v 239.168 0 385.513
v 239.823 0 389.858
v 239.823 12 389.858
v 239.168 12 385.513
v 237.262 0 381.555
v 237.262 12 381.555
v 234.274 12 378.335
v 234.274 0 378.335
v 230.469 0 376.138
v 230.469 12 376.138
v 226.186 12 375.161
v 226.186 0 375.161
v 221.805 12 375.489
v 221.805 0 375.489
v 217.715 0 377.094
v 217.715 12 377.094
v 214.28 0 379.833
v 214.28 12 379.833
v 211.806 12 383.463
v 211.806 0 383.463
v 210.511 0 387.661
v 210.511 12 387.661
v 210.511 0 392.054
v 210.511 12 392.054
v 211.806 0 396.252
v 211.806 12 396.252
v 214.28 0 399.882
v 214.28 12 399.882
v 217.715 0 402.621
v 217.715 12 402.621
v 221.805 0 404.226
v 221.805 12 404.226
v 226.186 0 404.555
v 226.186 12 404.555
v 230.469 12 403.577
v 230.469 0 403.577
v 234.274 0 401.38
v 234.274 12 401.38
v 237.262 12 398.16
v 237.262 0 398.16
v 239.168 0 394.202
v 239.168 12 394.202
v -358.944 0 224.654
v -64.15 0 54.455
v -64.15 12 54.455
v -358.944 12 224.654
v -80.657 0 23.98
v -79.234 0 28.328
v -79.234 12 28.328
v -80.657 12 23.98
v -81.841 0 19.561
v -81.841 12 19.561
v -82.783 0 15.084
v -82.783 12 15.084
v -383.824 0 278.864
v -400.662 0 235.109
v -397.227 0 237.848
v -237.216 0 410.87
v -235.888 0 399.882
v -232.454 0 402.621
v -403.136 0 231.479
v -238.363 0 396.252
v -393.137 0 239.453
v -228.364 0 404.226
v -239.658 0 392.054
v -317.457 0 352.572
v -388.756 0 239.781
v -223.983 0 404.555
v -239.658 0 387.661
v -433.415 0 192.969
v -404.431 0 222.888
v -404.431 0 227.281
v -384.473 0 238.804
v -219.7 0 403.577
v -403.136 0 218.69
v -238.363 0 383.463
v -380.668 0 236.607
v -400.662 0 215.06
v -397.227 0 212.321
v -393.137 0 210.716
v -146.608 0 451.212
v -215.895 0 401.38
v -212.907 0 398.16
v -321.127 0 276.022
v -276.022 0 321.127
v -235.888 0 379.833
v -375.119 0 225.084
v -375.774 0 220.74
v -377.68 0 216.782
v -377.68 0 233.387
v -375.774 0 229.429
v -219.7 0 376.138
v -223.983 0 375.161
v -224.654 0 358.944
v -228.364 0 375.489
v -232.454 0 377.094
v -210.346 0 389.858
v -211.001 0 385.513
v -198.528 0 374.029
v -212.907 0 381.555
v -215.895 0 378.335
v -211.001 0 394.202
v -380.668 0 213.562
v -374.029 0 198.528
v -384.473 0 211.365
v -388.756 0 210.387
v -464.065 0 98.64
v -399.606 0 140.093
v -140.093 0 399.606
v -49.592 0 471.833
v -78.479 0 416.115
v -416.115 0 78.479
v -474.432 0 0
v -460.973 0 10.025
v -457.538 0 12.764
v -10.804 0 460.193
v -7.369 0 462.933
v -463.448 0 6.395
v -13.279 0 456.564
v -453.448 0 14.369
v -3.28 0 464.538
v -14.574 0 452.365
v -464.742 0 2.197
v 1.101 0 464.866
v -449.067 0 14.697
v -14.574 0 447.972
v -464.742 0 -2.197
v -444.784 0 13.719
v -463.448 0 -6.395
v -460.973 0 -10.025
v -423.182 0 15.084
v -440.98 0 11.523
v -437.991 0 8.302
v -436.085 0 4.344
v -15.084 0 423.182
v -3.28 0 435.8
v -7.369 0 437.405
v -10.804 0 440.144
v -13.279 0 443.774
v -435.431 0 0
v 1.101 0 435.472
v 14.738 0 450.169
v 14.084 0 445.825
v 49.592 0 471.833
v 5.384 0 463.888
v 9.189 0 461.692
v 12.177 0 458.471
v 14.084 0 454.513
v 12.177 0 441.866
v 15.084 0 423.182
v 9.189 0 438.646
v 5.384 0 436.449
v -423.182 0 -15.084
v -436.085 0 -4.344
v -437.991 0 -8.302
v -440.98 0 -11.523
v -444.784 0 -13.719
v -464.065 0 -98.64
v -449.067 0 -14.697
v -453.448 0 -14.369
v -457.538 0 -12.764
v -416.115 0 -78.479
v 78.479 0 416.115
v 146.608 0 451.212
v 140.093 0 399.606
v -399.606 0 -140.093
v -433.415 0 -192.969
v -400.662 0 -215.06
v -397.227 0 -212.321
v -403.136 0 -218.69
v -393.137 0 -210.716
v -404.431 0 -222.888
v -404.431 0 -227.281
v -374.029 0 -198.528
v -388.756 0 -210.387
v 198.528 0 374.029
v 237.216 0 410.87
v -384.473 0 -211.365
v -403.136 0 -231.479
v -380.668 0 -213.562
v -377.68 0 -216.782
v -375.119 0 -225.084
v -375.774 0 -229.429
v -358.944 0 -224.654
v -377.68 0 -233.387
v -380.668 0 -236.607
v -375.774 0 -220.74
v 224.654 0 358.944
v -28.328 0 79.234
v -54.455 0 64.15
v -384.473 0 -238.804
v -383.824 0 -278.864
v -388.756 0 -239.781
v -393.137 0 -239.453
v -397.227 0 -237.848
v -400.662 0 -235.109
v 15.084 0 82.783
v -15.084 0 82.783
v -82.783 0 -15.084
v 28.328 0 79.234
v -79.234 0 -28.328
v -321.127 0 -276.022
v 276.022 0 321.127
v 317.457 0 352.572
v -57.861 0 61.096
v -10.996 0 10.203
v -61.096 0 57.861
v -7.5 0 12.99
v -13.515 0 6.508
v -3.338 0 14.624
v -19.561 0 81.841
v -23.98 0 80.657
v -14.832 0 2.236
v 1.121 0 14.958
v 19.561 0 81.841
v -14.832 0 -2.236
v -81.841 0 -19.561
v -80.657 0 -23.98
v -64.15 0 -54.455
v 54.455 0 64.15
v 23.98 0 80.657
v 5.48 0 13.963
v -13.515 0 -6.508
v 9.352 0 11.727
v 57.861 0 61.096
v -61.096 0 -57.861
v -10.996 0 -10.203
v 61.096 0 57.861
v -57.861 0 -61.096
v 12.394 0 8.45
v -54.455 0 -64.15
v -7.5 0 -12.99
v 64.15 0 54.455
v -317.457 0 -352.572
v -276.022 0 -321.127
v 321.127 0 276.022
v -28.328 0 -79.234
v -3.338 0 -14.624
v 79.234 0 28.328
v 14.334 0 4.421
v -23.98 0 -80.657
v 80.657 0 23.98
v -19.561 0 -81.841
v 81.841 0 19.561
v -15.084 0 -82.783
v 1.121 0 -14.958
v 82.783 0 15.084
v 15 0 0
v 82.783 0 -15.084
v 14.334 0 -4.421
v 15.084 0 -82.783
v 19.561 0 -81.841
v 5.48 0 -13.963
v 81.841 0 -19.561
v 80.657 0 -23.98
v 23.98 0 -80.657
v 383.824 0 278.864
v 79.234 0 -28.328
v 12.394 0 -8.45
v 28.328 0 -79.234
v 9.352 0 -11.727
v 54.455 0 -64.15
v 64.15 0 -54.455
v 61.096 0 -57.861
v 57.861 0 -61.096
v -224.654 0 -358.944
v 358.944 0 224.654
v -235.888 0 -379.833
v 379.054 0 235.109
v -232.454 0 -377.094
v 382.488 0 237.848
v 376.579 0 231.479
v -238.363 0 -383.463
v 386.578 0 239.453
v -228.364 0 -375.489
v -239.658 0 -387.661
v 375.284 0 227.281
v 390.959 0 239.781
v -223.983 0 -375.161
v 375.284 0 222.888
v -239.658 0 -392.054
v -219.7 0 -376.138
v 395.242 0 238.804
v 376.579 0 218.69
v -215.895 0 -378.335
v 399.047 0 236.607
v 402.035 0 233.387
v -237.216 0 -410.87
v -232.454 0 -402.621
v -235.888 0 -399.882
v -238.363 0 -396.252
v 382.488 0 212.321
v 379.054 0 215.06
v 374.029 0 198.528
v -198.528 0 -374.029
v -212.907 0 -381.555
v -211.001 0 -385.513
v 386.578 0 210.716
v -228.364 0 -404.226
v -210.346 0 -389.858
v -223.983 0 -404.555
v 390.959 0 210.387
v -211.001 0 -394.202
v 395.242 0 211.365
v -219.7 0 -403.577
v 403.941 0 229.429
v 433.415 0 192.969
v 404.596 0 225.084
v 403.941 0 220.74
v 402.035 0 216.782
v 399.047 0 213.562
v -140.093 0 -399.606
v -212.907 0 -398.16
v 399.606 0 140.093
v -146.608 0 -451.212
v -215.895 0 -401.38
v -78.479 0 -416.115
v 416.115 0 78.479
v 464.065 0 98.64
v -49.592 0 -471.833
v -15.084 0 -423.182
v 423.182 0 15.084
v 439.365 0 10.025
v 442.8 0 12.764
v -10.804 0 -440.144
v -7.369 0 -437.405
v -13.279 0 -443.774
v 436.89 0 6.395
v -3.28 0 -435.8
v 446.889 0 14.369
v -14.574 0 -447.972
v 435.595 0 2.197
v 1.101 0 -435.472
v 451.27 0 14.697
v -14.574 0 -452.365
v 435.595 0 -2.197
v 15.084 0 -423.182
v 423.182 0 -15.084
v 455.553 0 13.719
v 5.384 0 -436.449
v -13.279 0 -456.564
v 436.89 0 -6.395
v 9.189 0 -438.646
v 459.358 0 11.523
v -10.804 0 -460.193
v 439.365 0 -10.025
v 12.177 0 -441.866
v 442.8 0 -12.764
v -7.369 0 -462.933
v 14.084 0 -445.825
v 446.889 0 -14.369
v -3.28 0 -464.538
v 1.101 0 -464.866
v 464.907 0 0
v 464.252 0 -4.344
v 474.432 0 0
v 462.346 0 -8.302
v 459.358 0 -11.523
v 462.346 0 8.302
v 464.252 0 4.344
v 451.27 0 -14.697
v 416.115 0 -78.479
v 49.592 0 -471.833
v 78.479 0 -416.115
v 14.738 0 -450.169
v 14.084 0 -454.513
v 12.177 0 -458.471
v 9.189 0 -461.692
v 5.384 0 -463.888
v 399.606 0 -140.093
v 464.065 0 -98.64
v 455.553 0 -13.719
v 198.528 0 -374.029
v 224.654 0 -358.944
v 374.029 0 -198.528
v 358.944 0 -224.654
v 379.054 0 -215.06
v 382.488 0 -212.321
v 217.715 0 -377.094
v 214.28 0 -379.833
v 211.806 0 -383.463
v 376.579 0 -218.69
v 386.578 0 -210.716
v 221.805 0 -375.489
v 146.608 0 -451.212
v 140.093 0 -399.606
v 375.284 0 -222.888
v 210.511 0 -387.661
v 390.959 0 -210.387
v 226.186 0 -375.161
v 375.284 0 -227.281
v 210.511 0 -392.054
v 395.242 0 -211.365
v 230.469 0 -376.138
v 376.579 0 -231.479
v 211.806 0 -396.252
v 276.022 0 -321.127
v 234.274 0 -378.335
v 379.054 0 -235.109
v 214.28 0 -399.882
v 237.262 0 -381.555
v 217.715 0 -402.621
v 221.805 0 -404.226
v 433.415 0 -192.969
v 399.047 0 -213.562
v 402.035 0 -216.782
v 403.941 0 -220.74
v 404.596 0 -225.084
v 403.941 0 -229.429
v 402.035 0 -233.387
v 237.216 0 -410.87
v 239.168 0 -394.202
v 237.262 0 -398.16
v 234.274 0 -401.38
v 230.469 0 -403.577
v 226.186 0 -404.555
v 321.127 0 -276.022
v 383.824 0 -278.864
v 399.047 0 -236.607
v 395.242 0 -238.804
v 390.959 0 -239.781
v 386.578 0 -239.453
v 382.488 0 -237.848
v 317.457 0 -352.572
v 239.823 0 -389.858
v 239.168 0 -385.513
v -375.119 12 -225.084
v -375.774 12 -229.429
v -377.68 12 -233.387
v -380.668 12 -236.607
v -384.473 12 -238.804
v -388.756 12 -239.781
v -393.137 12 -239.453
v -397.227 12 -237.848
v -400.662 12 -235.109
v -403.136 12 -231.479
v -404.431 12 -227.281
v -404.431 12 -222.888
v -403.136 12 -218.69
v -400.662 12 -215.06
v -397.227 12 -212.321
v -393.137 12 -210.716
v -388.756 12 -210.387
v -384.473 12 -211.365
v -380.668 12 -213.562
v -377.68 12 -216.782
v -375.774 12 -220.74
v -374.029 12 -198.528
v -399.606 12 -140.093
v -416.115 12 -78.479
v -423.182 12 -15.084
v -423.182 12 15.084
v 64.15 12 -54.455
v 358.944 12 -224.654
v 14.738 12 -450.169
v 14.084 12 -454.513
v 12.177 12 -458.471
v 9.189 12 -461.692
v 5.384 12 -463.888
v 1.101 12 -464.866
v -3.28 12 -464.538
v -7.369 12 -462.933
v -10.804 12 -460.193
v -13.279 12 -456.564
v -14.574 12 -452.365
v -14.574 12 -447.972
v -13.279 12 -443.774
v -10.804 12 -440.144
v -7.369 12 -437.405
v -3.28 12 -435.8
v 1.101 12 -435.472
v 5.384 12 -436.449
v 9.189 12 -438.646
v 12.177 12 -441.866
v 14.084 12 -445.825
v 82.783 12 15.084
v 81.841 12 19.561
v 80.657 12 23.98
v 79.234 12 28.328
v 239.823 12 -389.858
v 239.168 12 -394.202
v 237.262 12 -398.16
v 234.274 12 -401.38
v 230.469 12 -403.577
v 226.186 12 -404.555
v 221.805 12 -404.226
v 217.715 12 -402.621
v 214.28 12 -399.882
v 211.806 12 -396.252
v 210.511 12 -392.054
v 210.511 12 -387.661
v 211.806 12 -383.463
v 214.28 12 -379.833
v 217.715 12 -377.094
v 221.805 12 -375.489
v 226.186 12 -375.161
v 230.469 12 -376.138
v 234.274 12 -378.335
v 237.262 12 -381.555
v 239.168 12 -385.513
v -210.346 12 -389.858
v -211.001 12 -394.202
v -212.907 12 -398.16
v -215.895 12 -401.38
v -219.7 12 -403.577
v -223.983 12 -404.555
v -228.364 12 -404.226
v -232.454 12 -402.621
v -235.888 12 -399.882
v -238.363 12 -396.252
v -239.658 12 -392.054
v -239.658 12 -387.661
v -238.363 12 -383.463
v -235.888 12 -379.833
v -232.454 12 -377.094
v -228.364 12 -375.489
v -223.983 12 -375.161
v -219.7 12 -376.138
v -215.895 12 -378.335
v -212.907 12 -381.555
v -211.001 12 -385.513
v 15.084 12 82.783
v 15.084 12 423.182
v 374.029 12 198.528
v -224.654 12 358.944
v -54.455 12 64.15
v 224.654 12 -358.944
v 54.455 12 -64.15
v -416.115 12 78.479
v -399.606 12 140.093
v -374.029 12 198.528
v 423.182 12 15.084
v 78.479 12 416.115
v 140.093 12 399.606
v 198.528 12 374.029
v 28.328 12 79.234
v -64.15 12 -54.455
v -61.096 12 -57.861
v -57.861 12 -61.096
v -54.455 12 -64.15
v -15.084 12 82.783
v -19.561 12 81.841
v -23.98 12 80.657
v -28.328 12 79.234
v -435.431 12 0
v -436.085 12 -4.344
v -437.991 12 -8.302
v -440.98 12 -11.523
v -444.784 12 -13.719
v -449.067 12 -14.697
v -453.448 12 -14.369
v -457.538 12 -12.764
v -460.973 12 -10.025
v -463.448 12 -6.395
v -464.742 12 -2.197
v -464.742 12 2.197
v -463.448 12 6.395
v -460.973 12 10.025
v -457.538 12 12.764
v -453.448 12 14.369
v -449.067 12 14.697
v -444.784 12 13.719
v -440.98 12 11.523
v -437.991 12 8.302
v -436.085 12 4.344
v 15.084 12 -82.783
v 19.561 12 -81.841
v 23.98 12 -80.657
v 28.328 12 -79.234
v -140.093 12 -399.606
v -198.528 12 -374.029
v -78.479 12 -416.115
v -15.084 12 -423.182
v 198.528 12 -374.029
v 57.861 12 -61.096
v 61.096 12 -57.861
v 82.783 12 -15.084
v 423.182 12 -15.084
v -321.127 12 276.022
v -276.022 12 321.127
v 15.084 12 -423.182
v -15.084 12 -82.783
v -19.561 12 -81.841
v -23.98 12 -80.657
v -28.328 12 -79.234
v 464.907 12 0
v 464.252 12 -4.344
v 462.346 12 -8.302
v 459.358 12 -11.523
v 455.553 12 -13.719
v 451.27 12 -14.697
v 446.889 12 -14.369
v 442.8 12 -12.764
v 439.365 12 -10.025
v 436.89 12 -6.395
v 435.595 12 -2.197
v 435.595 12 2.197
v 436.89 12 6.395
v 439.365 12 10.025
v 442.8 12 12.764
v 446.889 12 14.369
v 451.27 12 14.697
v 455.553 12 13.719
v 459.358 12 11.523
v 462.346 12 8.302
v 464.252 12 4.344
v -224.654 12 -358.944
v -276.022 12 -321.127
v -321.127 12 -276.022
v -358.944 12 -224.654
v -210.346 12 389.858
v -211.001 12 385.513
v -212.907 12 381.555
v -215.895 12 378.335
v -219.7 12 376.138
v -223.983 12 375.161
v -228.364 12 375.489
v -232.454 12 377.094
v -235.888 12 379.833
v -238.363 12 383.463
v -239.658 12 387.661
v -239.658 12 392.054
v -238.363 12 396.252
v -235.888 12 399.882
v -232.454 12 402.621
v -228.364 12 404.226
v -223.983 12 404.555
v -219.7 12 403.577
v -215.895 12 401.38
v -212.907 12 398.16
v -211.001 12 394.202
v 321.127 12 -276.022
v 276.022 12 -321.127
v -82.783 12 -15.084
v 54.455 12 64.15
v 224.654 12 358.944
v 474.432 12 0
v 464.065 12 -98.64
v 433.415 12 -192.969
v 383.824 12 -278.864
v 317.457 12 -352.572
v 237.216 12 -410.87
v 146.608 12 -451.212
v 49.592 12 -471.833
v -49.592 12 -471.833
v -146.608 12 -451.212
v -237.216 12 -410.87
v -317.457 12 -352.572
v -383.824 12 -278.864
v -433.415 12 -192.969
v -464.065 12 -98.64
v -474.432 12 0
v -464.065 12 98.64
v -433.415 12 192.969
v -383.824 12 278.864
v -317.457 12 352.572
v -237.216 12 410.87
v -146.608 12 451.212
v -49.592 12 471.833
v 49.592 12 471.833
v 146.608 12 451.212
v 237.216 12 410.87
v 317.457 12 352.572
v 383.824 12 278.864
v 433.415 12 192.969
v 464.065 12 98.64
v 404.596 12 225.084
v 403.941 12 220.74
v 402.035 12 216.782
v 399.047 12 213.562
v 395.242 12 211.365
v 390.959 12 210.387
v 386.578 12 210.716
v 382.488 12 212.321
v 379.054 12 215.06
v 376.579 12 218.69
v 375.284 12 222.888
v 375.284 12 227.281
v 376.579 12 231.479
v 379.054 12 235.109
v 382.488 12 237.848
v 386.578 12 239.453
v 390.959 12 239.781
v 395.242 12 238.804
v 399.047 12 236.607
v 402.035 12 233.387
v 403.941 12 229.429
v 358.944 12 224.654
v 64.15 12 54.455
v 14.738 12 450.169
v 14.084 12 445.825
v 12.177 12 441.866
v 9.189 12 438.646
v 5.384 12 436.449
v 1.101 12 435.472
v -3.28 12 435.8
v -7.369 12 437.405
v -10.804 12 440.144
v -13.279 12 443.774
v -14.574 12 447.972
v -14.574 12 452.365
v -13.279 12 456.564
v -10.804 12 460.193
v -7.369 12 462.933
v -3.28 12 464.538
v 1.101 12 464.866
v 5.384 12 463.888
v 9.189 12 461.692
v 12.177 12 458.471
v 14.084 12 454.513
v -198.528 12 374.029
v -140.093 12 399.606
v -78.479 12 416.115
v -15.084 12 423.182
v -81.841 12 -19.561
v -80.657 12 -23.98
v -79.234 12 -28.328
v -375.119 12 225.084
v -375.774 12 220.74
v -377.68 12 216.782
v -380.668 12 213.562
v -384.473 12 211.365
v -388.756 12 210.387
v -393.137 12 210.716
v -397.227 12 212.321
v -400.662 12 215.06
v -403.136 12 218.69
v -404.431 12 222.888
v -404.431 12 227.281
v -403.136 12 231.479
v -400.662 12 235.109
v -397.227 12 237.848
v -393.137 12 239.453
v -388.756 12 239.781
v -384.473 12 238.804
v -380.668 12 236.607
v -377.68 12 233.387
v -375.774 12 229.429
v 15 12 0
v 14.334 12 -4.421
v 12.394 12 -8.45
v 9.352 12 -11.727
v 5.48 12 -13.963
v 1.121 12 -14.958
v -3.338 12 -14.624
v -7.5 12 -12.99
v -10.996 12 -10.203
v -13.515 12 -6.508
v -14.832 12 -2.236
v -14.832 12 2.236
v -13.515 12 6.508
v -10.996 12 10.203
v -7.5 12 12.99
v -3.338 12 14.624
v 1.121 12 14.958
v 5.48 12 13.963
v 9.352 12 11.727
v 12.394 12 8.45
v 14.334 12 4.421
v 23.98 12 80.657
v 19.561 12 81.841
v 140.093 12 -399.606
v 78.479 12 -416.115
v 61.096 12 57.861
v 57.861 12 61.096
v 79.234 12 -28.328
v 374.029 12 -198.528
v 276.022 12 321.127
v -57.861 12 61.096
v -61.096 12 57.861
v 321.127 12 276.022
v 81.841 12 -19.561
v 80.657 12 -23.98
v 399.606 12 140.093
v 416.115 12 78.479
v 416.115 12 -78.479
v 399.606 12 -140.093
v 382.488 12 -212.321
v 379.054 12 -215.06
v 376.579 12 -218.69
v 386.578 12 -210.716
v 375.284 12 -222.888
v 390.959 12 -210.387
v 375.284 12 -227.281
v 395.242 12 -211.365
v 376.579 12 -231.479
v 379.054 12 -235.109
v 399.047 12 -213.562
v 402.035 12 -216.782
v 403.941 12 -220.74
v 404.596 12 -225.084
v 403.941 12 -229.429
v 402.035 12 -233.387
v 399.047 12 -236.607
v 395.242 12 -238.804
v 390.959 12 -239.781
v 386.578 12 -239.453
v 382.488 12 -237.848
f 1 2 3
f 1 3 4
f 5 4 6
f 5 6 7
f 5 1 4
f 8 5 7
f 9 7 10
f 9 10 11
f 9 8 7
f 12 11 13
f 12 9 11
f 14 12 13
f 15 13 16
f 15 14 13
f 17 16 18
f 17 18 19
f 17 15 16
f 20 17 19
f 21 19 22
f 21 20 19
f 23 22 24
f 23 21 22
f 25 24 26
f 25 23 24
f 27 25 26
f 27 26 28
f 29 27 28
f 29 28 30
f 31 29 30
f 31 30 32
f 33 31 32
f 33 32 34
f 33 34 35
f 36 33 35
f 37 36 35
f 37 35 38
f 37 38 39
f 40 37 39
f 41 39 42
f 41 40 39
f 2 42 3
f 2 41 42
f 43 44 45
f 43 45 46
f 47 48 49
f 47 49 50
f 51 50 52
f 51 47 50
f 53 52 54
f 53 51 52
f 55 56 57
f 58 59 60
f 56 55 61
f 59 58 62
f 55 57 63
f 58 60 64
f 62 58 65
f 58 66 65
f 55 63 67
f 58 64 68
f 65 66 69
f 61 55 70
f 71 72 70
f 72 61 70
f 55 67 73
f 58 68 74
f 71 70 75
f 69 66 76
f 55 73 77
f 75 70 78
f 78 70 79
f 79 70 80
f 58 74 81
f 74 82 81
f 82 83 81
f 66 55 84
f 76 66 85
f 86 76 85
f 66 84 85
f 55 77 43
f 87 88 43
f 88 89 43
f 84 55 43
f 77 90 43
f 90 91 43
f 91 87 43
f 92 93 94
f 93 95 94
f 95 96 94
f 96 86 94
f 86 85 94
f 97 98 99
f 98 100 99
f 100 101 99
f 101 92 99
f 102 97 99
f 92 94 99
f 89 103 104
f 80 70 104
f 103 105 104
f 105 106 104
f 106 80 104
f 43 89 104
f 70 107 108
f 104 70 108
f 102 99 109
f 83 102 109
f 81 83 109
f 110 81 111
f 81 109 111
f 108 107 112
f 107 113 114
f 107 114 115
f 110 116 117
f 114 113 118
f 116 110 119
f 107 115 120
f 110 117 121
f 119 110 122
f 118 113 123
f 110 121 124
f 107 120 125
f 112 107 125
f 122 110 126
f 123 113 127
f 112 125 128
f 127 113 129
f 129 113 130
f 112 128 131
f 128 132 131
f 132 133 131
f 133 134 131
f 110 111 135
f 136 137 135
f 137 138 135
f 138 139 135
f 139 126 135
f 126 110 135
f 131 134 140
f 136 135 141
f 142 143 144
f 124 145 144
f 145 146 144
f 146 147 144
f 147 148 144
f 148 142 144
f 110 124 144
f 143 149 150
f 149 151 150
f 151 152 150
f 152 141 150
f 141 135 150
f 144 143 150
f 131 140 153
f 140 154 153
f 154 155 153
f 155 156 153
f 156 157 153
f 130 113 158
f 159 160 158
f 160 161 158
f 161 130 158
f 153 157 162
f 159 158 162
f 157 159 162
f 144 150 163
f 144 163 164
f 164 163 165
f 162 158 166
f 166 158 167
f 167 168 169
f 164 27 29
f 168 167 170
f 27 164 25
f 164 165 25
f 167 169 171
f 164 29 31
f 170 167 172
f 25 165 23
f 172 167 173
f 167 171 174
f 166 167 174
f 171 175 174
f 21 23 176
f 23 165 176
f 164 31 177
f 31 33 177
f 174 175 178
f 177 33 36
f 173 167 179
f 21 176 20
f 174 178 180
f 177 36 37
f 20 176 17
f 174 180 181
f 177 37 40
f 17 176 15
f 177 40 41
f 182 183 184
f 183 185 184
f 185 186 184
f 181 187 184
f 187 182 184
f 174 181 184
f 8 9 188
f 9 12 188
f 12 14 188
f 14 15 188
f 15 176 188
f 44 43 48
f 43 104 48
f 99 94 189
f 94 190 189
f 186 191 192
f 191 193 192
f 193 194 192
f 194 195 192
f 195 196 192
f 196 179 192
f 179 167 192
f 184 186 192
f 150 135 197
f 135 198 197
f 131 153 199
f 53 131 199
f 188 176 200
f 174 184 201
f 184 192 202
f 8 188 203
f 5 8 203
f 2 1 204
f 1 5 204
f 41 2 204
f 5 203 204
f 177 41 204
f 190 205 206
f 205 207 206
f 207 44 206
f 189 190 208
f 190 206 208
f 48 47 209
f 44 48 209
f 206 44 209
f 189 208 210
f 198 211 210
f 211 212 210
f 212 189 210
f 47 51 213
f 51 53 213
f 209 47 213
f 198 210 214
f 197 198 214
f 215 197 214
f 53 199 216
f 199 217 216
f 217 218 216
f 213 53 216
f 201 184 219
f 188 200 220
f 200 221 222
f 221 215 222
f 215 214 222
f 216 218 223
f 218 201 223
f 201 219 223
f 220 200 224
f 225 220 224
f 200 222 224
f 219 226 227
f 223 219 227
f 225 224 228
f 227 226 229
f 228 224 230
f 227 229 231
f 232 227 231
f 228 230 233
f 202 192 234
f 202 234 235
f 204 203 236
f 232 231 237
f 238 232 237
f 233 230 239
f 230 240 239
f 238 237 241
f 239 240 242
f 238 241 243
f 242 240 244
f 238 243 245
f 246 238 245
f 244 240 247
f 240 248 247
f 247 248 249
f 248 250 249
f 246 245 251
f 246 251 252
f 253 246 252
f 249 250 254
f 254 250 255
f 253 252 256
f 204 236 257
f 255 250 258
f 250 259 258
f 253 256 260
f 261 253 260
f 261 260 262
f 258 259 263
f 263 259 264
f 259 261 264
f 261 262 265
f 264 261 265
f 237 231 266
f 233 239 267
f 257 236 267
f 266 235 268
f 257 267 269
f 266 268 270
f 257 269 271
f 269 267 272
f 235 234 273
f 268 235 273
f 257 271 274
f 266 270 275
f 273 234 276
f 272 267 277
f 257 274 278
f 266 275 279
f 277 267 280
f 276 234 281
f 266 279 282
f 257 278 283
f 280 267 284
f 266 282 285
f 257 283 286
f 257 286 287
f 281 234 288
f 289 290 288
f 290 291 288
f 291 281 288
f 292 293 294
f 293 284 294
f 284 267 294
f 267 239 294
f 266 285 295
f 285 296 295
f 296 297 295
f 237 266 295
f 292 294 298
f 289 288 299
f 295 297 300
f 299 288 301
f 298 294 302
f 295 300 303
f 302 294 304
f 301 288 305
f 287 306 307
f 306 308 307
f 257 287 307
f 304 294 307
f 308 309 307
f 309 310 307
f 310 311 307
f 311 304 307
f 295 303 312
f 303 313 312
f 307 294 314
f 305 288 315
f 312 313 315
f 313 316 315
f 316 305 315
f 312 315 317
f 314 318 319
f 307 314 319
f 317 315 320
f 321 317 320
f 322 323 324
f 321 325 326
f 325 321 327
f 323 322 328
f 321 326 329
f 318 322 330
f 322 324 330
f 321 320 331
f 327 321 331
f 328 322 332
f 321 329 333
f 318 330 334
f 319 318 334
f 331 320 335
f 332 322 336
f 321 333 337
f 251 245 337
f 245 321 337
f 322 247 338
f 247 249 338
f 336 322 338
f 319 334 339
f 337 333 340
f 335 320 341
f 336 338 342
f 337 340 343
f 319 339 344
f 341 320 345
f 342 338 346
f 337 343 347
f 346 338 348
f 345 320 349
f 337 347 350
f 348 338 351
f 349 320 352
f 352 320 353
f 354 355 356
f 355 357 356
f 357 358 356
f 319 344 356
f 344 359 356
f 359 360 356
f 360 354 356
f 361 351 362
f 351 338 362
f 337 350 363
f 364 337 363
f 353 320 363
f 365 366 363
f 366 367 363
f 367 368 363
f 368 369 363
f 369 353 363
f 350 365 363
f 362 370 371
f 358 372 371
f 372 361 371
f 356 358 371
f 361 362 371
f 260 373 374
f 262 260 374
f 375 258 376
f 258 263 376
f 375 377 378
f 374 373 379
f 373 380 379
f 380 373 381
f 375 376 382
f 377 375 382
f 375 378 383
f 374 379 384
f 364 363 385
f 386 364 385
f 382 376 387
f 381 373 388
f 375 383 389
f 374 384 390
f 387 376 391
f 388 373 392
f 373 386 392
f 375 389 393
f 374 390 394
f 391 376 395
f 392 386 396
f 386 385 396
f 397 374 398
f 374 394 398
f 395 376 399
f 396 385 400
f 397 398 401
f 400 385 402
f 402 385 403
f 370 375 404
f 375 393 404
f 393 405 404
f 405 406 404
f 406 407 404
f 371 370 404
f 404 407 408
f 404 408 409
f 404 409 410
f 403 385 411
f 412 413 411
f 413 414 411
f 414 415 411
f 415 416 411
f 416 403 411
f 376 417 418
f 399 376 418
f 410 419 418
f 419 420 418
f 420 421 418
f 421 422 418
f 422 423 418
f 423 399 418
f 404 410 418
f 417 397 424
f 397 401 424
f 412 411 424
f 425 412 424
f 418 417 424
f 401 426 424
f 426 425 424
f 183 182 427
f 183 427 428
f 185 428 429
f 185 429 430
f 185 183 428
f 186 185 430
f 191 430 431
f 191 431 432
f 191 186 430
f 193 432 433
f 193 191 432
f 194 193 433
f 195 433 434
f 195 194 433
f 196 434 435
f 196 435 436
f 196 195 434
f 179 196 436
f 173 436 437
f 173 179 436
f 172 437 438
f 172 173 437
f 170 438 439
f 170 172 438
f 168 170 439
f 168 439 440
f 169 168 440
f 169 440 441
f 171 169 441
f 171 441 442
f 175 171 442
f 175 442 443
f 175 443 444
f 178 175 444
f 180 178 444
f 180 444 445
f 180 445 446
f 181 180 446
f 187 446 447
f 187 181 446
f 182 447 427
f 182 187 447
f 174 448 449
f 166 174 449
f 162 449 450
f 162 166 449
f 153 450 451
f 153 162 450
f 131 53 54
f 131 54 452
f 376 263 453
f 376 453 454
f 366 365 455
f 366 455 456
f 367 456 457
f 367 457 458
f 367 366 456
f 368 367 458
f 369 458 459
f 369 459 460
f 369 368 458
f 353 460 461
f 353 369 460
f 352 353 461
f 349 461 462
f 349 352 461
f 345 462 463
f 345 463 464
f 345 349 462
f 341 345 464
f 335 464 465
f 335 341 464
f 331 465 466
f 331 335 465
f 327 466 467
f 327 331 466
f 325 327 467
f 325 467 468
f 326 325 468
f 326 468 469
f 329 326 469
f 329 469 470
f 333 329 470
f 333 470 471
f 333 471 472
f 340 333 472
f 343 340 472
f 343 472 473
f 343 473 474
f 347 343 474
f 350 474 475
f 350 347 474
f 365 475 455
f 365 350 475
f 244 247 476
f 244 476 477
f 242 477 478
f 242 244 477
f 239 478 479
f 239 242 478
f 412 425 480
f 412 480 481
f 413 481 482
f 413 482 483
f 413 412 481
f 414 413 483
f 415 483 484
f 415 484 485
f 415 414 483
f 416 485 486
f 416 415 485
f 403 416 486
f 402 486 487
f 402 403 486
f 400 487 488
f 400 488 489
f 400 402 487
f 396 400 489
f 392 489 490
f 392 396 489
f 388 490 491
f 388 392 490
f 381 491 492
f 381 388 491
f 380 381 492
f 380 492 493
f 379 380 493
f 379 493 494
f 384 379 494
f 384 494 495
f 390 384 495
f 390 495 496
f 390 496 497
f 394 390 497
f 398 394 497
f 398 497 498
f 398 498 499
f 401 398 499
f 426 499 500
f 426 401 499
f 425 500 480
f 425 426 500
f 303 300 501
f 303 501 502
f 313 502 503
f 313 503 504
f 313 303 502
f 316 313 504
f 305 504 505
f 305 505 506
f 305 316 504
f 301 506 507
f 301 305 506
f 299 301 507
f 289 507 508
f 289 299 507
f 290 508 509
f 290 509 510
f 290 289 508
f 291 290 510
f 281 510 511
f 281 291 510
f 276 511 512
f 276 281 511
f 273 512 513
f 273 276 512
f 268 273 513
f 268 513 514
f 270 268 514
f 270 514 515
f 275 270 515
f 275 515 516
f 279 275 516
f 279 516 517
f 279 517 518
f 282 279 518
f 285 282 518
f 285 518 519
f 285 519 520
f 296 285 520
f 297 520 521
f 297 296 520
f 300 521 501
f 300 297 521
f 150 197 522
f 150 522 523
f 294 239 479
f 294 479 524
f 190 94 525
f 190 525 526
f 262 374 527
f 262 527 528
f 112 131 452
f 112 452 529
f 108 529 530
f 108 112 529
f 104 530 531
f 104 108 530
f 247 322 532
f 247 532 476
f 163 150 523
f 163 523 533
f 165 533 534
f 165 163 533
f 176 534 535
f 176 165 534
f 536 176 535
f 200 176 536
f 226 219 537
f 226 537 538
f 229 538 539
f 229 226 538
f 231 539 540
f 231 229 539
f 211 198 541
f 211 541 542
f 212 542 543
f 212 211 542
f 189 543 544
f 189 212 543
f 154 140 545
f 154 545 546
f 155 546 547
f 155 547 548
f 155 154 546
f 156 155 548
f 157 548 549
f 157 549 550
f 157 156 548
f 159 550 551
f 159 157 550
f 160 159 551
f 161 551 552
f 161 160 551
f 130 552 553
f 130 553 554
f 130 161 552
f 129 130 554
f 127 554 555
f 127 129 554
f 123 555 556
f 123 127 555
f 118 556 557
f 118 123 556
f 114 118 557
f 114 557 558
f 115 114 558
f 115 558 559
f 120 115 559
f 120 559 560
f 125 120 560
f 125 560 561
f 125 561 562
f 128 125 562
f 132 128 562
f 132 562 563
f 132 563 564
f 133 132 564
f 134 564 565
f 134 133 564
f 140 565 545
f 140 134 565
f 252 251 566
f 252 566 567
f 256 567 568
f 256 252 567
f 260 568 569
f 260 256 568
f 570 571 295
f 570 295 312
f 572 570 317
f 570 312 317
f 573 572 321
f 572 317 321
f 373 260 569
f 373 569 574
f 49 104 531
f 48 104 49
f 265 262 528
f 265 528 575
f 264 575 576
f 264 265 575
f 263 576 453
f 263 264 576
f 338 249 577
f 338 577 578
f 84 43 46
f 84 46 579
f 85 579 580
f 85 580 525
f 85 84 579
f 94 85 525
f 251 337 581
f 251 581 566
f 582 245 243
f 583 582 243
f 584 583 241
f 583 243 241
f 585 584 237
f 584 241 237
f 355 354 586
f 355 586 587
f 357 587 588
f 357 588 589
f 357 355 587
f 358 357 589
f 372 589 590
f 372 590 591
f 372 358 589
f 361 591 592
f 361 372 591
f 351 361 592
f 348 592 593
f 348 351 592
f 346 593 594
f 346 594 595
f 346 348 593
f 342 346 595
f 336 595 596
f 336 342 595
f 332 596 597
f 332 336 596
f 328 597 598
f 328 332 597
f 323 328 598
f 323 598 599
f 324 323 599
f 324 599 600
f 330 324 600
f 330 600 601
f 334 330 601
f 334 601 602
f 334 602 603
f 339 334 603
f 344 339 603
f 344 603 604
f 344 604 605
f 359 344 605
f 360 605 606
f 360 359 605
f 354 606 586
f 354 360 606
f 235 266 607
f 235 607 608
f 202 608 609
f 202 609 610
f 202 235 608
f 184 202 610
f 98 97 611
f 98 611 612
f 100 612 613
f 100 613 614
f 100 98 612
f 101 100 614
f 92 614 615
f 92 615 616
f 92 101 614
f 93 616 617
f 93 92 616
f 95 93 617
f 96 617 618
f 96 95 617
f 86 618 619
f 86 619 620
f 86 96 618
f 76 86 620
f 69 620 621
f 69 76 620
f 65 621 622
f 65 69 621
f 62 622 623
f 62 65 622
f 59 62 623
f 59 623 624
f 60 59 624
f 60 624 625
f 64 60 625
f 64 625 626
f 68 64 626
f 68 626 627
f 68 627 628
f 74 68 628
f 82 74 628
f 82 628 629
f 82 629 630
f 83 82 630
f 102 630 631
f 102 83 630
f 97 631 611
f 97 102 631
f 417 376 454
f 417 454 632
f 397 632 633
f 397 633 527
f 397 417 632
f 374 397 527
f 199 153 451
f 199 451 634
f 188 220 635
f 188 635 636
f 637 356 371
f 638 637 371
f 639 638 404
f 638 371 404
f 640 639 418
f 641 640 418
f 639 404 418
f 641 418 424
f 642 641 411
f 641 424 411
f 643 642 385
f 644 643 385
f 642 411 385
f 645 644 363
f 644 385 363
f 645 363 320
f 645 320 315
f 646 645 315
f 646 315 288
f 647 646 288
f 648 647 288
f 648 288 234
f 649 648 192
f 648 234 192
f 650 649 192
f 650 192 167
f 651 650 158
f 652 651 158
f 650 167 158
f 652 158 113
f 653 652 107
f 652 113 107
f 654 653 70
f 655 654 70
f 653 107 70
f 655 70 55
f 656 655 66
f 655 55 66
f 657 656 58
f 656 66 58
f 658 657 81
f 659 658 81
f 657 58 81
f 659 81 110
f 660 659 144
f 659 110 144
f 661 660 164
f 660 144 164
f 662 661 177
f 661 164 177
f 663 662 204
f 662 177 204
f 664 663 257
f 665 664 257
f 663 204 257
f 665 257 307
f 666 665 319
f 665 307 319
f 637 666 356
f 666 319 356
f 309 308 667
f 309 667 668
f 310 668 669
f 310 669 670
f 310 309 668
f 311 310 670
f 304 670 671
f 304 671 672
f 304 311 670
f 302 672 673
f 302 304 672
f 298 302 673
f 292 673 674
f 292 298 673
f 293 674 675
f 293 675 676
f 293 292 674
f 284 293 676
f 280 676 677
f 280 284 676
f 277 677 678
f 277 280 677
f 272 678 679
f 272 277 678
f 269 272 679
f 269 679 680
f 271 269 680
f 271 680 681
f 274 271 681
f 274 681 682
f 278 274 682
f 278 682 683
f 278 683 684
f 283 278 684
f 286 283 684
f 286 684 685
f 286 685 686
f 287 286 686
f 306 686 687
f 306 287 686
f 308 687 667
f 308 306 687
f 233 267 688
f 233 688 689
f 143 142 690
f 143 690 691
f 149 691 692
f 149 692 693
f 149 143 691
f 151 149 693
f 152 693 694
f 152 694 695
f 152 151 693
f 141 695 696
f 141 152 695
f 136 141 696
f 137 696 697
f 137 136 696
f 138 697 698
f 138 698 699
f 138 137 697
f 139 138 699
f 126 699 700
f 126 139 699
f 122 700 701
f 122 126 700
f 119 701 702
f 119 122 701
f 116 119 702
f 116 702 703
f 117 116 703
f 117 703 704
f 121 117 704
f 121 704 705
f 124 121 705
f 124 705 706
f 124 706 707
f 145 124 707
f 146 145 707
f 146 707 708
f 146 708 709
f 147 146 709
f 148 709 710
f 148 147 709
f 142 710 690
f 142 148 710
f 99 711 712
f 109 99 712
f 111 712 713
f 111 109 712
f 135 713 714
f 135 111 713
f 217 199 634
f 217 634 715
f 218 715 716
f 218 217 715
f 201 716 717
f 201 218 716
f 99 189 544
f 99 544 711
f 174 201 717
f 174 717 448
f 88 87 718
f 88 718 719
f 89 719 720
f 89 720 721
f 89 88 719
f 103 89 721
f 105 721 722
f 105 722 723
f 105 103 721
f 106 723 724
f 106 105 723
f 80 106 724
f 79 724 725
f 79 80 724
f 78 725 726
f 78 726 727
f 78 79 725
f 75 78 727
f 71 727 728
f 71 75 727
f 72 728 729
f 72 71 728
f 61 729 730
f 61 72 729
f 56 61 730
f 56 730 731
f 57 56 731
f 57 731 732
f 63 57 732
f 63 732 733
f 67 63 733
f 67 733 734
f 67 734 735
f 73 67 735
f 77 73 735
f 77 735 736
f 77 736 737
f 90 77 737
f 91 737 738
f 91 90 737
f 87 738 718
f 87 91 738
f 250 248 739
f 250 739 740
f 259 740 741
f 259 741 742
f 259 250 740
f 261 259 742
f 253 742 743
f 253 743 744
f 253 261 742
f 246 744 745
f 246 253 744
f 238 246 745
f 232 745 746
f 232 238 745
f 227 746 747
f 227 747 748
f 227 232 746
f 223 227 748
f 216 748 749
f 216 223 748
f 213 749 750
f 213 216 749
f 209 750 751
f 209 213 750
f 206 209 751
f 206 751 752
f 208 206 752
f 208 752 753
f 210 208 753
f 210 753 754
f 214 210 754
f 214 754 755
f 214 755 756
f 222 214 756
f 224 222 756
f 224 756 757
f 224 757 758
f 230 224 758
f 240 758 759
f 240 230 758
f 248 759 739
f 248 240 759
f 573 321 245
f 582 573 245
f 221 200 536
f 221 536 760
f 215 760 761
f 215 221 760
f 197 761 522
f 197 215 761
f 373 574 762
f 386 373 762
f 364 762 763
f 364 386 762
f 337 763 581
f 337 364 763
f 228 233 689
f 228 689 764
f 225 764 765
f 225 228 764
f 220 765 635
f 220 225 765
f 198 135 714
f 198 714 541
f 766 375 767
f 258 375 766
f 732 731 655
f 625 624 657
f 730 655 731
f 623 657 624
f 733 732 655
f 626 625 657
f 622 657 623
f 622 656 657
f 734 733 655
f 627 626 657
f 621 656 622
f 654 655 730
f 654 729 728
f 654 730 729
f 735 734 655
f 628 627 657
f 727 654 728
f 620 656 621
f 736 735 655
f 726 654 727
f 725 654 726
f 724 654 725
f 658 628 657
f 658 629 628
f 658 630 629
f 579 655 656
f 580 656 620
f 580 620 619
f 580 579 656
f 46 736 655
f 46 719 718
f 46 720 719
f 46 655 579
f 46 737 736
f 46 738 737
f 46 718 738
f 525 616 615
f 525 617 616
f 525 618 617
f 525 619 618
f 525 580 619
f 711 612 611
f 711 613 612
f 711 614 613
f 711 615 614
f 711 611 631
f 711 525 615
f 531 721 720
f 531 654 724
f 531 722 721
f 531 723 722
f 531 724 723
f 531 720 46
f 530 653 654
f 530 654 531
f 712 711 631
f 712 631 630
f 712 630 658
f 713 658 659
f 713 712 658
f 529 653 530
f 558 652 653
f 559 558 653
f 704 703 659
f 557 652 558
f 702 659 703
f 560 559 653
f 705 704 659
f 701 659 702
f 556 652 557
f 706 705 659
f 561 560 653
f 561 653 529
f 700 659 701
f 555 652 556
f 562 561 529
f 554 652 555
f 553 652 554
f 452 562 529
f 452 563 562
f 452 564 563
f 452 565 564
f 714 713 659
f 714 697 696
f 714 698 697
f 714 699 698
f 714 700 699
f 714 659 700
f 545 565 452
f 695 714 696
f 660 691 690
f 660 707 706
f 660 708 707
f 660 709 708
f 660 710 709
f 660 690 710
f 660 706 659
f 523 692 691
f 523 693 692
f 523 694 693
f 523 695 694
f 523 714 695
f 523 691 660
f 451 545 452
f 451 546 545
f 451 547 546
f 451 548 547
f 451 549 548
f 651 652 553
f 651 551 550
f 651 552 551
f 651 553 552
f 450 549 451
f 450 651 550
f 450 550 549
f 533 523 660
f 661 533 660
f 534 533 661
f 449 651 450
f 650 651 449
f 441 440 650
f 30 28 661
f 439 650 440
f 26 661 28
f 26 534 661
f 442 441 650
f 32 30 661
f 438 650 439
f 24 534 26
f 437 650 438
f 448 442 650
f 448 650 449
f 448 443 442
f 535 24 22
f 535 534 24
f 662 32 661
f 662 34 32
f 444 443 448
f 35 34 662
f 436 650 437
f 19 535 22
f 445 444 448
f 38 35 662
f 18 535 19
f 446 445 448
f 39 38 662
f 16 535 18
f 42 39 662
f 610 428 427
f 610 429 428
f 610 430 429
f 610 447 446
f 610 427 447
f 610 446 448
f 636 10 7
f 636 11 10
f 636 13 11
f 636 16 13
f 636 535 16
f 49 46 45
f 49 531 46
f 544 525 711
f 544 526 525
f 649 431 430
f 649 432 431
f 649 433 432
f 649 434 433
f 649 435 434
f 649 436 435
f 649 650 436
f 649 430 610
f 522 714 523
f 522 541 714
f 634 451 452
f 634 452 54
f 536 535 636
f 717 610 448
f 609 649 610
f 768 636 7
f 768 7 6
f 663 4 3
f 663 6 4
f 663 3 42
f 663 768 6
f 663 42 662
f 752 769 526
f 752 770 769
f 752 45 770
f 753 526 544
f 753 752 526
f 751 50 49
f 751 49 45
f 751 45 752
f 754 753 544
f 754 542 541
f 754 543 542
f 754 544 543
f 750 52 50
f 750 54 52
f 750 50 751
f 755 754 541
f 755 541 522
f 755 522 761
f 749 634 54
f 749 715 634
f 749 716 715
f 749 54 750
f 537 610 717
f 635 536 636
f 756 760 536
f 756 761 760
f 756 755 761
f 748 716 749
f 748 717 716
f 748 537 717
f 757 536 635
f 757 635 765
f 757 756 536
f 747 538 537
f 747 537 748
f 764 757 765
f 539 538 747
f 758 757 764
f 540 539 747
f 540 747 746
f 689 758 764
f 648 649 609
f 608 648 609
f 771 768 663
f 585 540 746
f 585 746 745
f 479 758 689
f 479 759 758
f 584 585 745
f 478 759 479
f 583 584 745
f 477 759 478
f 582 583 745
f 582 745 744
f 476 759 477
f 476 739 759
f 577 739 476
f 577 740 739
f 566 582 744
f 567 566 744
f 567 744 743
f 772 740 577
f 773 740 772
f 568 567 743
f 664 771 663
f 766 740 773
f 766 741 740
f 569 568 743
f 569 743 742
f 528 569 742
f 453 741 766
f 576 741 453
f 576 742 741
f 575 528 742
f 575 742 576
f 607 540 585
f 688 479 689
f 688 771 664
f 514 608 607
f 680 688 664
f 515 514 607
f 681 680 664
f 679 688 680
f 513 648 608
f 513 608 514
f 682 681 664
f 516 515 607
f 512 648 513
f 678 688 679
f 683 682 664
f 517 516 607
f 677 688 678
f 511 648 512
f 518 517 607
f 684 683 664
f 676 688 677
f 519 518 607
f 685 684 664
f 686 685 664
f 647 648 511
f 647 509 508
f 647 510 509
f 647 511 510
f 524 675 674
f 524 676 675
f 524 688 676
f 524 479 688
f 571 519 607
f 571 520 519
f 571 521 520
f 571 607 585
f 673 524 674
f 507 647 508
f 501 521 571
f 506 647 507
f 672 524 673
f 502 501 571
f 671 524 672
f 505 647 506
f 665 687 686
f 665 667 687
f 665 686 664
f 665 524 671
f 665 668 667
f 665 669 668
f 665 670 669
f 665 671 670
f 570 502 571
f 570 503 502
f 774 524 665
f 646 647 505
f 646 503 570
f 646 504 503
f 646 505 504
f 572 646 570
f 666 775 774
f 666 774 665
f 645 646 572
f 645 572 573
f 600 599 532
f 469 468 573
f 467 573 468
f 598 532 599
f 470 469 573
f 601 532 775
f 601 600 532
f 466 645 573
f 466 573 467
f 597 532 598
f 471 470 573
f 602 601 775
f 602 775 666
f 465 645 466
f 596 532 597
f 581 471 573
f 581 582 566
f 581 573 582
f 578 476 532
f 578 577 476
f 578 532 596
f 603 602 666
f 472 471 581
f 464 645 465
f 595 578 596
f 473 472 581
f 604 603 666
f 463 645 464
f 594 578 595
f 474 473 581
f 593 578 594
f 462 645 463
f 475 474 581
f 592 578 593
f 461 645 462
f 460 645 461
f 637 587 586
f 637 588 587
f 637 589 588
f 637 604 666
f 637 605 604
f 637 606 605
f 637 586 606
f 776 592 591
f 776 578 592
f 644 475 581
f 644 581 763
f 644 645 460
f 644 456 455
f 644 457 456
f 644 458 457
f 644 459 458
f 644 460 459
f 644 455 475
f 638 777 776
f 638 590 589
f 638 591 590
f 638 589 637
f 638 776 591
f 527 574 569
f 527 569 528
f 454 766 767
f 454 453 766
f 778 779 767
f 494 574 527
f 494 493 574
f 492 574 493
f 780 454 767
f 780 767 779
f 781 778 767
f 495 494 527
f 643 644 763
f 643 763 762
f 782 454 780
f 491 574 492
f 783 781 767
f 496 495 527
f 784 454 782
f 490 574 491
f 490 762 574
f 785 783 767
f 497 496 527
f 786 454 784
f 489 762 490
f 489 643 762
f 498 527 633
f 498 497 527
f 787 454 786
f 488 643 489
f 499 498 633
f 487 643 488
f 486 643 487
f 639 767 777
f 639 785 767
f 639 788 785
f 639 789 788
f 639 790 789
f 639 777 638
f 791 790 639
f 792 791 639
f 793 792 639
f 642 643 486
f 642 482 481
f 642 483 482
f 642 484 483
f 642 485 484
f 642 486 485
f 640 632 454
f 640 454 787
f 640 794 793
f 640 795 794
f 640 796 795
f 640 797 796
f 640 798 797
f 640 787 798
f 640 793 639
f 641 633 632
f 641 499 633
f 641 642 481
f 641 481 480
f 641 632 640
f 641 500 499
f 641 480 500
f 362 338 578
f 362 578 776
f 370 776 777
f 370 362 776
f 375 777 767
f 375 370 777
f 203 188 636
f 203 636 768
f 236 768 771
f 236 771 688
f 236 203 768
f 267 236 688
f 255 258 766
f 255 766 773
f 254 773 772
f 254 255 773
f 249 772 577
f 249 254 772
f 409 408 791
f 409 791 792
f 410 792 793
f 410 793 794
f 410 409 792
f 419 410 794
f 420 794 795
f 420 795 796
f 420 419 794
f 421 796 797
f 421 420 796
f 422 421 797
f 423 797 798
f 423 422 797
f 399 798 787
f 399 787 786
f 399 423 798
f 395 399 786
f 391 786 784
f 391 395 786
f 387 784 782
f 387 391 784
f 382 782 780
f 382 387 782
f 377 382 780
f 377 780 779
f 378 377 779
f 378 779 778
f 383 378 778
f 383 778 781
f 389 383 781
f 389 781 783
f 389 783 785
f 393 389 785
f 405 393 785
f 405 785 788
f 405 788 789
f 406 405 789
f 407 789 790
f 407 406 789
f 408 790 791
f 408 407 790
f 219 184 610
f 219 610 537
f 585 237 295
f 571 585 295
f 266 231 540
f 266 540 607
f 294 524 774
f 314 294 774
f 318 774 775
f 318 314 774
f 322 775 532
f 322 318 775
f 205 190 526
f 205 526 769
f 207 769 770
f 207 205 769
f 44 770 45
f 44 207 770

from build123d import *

# Parameters (mm, degrees)
SKETCH1_R            = 474.432327188
SKETCH1_R_2          = 15
SKETCH1_R_3          = 14.738282491
BOSS_EXTRUDE15_DEPTH = 12


with BuildPart() as part:
    # Sketch1 → Boss-Extrude15 (new body)
    with BuildSketch(Plane(origin=(0, 0, 0), x_dir=(1, 0, 0), z_dir=(0, 1, 0))):
        Circle(SKETCH1_R)
        Circle(SKETCH1_R_2, mode=Mode.SUBTRACT)
        with Locations((0, 450.168808025)):
            Circle(SKETCH1_R_3, mode=Mode.SUBTRACT)
        with Locations((225.084404013, 389.857623741)):
            Circle(SKETCH1_R_3, mode=Mode.SUBTRACT)
        with Locations((389.857623741, 225.084404013)):
            Circle(SKETCH1_R_3, mode=Mode.SUBTRACT)
        with Locations((450.168808025, 0)):
            Circle(SKETCH1_R_3, mode=Mode.SUBTRACT)
        with Locations((389.857623741, -225.084404013)):
            Circle(SKETCH1_R_3, mode=Mode.SUBTRACT)
        with Locations((225.084404013, -389.857623741)):
            Circle(SKETCH1_R_3, mode=Mode.SUBTRACT)
        with Locations((0, -450.168808025)):
            Circle(SKETCH1_R_3, mode=Mode.SUBTRACT)
        with Locations((-225.084404012, -389.857623741)):
            Circle(SKETCH1_R_3, mode=Mode.SUBTRACT)
        with Locations((-389.857623741, -225.084404013)):
            Circle(SKETCH1_R_3, mode=Mode.SUBTRACT)
        with Locations((-450.168808025, 0)):
            Circle(SKETCH1_R_3, mode=Mode.SUBTRACT)
        with Locations((-389.857623741, 225.084404013)):
            Circle(SKETCH1_R_3, mode=Mode.SUBTRACT)
        with Locations((-225.084404013, 389.857623741)):
            Circle(SKETCH1_R_3, mode=Mode.SUBTRACT)
        with BuildLine():
            Line((15.084021598, 423.182152072), (15.084021598, 82.782783758))
            ThreePointArc((15.084021598, 82.782783758), (21.778537661, 81.278609065), (28.328245984, 79.234004529))
            Line((28.328245984, 79.234004529), (198.527930141, 374.028504921))
            ThreePointArc((198.527930141, 374.028504921), (109.597156617, 409.022156859), (15.084021598, 423.182152072))
        make_face(mode=Mode.SUBTRACT)
        with BuildLine():
            Line((-15.084021598, 423.182152072), (-15.084021598, 82.782783758))
            ThreePointArc((-15.084021598, 82.782783758), (-21.778537661, 81.278609065), (-28.328245984, 79.234004529))
            Line((-28.328245984, 79.234004529), (-198.527930141, 374.028504921))
            ThreePointArc((-198.527930141, 374.028504921), (-109.597156617, 409.022156859), (-15.084021598, 423.182152072))
        make_face(mode=Mode.SUBTRACT)
        with BuildLine():
            Line((224.654221931, 358.944483323), (54.454537774, 64.149982931))
            ThreePointArc((54.454537774, 64.149982931), (59.500071404, 59.500071404), (64.149982931, 54.454537774))
            Line((64.149982931, 54.454537774), (358.944483323, 224.654221931))
            ThreePointArc((358.944483323, 224.654221931), (299.425000242, 299.425000242), (224.654221931, 358.944483323))
        make_face(mode=Mode.SUBTRACT)
        with BuildLine():
            Line((374.028504921, 198.527930141), (79.234004529, 28.328245984))
            ThreePointArc((79.234004529, 28.328245984), (81.278609065, 21.778537661), (82.782783758, 15.084021598))
            Line((82.782783758, 15.084021598), (423.182152072, 15.084021598))
            ThreePointArc((423.182152072, 15.084021598), (409.022156859, 109.597156617), (374.028504921, 198.527930141))
        make_face(mode=Mode.SUBTRACT)
        with BuildLine():
            Line((423.182152072, -15.084021598), (82.782783758, -15.084021598))
            ThreePointArc((82.782783758, -15.084021598), (81.278609065, -21.778537661), (79.234004529, -28.328245984))
            Line((79.234004529, -28.328245984), (374.028504921, -198.527930141))
            ThreePointArc((374.028504921, -198.527930141), (409.022156859, -109.597156617), (423.182152072, -15.084021598))
        make_face(mode=Mode.SUBTRACT)
        with BuildLine():
            Line((358.944483323, -224.654221931), (64.149982931, -54.454537774))
            ThreePointArc((64.149982931, -54.454537774), (59.500071404, -59.500071404), (54.454537774, -64.149982931))
            Line((54.454537774, -64.149982931), (224.654221931, -358.944483323))
            ThreePointArc((224.654221931, -358.944483323), (299.425000242, -299.425000242), (358.944483323, -224.654221931))
        make_face(mode=Mode.SUBTRACT)
        with BuildLine():
            Line((198.527930141, -374.028504921), (28.328245984, -79.234004529))
            ThreePointArc((28.328245984, -79.234004529), (21.778537661, -81.278609065), (15.084021598, -82.782783758))
            Line((15.084021598, -82.782783758), (15.084021598, -423.182152072))
            ThreePointArc((15.084021598, -423.182152072), (109.597156617, -409.022156859), (198.527930141, -374.028504921))
        make_face(mode=Mode.SUBTRACT)
        with BuildLine():
            Line((-15.084021598, -423.182152072), (-15.084021598, -82.782783758))
            ThreePointArc((-15.084021598, -82.782783758), (-21.778537661, -81.278609065), (-28.328245984, -79.234004529))
            Line((-28.328245984, -79.234004529), (-198.527930141, -374.028504921))
            ThreePointArc((-198.527930141, -374.028504921), (-109.597156617, -409.022156859), (-15.084021598, -423.182152072))
        make_face(mode=Mode.SUBTRACT)
        with BuildLine():
            Line((-224.654221931, -358.944483323), (-54.454537774, -64.149982931))
            ThreePointArc((-54.454537774, -64.149982931), (-59.500071404, -59.500071404), (-64.149982931, -54.454537774))
            Line((-64.149982931, -54.454537774), (-358.944483323, -224.654221931))
            ThreePointArc((-358.944483323, -224.654221931), (-299.425000242, -299.425000242), (-224.654221931, -358.944483323))
        make_face(mode=Mode.SUBTRACT)
        with BuildLine():
            Line((-374.028504921, -198.527930141), (-79.234004529, -28.328245984))
            ThreePointArc((-79.234004529, -28.328245984), (-81.278609065, -21.778537661), (-82.782783758, -15.084021598))
            Line((-82.782783758, -15.084021598), (-423.182152072, -15.084021598))
            ThreePointArc((-423.182152072, -15.084021598), (-409.022156859, -109.597156617), (-374.028504921, -198.527930141))
        make_face(mode=Mode.SUBTRACT)
        with BuildLine():
            Line((-423.182152072, 15.084021598), (-82.782783758, 15.084021598))
            ThreePointArc((-82.782783758, 15.084021598), (-81.278609065, 21.778537661), (-79.234004529, 28.328245984))
            Line((-79.234004529, 28.328245984), (-374.028504921, 198.527930141))
            ThreePointArc((-374.028504921, 198.527930141), (-409.022156859, 109.597156617), (-423.182152072, 15.084021598))
        make_face(mode=Mode.SUBTRACT)
        with BuildLine():
            Line((-358.944483323, 224.654221931), (-64.149982931, 54.454537774))
            ThreePointArc((-64.149982931, 54.454537774), (-59.500071404, 59.500071404), (-54.454537774, 64.149982931))
            Line((-54.454537774, 64.149982931), (-224.654221931, 358.944483323))
            ThreePointArc((-224.654221931, 358.944483323), (-299.425000242, 299.425000242), (-358.944483323, 224.654221931))
        make_face(mode=Mode.SUBTRACT)
    extrude(amount=BOSS_EXTRUDE15_DEPTH)


solid = part.part
